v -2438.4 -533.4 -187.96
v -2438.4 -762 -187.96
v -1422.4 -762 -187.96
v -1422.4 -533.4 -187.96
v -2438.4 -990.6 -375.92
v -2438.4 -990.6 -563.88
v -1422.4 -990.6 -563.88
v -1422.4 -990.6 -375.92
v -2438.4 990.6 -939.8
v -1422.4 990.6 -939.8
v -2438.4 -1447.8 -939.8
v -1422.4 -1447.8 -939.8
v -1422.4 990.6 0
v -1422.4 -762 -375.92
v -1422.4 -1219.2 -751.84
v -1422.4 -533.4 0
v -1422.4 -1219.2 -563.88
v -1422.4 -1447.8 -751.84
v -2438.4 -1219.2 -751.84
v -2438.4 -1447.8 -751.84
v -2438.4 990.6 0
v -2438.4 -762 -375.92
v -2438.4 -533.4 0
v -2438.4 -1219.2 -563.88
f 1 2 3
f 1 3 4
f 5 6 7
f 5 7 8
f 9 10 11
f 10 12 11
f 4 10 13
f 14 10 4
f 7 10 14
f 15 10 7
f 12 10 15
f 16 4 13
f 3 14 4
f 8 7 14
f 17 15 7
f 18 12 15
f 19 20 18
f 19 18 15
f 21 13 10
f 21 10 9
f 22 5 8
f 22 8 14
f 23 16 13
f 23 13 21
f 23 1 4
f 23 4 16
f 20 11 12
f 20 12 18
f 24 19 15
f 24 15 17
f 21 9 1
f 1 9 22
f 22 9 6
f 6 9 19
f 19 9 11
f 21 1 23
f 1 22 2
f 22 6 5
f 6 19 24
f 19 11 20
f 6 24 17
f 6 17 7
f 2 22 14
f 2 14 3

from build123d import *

# Parameters (mm, degrees)
F0_W      = 4876.8
F0_H      = 1066.8
F1_DEPTH  = 101.6
F3_DEPTH  = 1016
F7_W      = 3860.8
F7_H      = 1066.8
F8_DEPTH  = 458.42061
F9_W      = 1016
F9_H      = 939.8
F10_DEPTH = 457.2


# Not quite as in the source:
# - a feature of the source that left no trace in its solid (it failed there, or was rolled back) is left out


with BuildPart() as f1:
    # F0 (on Top) → F1 (new body)
    with BuildSketch(Plane.XY):
        Rectangle(F0_W, F0_H)
    extrude(amount=-F1_DEPTH)

    # F2 (on face) → F3 (join)
    with BuildSketch(Plane(origin=(-2438.4, 0, 0), x_dir=(0, -1, 0), z_dir=(-1, 0, 0))):
        Polygon((533.4, -187.96), (533.4, 0), (304.8, 0), (-533.4, 0), (-533.4, -939.8), (304.8, -939.8), (1447.8, -939.8), (1447.8, -751.84), (1219.2, -751.84), (1219.2, -563.88), (990.6, -563.88), (990.6, -375.92), (762, -375.92), (762, -187.96), align=None)
    extrude(amount=-F3_DEPTH)

    # F7 (on face) → F8 (cut)
    with BuildSketch(Plane.XY):
        with Locations((508, 0)):
            Rectangle(F7_W, F7_H)
    extrude(amount=-F8_DEPTH, mode=Mode.SUBTRACT)

    # F9 (on face) → F10 (join)
    with BuildSketch(Plane(origin=(0, 533.4, 0), x_dir=(-1, 0, 0), z_dir=(0, 1, 0))):
        with Locations((1930.4, -469.9)):
            Rectangle(F9_W, F9_H)
    extrude(amount=F10_DEPTH)


solid = f1.part
